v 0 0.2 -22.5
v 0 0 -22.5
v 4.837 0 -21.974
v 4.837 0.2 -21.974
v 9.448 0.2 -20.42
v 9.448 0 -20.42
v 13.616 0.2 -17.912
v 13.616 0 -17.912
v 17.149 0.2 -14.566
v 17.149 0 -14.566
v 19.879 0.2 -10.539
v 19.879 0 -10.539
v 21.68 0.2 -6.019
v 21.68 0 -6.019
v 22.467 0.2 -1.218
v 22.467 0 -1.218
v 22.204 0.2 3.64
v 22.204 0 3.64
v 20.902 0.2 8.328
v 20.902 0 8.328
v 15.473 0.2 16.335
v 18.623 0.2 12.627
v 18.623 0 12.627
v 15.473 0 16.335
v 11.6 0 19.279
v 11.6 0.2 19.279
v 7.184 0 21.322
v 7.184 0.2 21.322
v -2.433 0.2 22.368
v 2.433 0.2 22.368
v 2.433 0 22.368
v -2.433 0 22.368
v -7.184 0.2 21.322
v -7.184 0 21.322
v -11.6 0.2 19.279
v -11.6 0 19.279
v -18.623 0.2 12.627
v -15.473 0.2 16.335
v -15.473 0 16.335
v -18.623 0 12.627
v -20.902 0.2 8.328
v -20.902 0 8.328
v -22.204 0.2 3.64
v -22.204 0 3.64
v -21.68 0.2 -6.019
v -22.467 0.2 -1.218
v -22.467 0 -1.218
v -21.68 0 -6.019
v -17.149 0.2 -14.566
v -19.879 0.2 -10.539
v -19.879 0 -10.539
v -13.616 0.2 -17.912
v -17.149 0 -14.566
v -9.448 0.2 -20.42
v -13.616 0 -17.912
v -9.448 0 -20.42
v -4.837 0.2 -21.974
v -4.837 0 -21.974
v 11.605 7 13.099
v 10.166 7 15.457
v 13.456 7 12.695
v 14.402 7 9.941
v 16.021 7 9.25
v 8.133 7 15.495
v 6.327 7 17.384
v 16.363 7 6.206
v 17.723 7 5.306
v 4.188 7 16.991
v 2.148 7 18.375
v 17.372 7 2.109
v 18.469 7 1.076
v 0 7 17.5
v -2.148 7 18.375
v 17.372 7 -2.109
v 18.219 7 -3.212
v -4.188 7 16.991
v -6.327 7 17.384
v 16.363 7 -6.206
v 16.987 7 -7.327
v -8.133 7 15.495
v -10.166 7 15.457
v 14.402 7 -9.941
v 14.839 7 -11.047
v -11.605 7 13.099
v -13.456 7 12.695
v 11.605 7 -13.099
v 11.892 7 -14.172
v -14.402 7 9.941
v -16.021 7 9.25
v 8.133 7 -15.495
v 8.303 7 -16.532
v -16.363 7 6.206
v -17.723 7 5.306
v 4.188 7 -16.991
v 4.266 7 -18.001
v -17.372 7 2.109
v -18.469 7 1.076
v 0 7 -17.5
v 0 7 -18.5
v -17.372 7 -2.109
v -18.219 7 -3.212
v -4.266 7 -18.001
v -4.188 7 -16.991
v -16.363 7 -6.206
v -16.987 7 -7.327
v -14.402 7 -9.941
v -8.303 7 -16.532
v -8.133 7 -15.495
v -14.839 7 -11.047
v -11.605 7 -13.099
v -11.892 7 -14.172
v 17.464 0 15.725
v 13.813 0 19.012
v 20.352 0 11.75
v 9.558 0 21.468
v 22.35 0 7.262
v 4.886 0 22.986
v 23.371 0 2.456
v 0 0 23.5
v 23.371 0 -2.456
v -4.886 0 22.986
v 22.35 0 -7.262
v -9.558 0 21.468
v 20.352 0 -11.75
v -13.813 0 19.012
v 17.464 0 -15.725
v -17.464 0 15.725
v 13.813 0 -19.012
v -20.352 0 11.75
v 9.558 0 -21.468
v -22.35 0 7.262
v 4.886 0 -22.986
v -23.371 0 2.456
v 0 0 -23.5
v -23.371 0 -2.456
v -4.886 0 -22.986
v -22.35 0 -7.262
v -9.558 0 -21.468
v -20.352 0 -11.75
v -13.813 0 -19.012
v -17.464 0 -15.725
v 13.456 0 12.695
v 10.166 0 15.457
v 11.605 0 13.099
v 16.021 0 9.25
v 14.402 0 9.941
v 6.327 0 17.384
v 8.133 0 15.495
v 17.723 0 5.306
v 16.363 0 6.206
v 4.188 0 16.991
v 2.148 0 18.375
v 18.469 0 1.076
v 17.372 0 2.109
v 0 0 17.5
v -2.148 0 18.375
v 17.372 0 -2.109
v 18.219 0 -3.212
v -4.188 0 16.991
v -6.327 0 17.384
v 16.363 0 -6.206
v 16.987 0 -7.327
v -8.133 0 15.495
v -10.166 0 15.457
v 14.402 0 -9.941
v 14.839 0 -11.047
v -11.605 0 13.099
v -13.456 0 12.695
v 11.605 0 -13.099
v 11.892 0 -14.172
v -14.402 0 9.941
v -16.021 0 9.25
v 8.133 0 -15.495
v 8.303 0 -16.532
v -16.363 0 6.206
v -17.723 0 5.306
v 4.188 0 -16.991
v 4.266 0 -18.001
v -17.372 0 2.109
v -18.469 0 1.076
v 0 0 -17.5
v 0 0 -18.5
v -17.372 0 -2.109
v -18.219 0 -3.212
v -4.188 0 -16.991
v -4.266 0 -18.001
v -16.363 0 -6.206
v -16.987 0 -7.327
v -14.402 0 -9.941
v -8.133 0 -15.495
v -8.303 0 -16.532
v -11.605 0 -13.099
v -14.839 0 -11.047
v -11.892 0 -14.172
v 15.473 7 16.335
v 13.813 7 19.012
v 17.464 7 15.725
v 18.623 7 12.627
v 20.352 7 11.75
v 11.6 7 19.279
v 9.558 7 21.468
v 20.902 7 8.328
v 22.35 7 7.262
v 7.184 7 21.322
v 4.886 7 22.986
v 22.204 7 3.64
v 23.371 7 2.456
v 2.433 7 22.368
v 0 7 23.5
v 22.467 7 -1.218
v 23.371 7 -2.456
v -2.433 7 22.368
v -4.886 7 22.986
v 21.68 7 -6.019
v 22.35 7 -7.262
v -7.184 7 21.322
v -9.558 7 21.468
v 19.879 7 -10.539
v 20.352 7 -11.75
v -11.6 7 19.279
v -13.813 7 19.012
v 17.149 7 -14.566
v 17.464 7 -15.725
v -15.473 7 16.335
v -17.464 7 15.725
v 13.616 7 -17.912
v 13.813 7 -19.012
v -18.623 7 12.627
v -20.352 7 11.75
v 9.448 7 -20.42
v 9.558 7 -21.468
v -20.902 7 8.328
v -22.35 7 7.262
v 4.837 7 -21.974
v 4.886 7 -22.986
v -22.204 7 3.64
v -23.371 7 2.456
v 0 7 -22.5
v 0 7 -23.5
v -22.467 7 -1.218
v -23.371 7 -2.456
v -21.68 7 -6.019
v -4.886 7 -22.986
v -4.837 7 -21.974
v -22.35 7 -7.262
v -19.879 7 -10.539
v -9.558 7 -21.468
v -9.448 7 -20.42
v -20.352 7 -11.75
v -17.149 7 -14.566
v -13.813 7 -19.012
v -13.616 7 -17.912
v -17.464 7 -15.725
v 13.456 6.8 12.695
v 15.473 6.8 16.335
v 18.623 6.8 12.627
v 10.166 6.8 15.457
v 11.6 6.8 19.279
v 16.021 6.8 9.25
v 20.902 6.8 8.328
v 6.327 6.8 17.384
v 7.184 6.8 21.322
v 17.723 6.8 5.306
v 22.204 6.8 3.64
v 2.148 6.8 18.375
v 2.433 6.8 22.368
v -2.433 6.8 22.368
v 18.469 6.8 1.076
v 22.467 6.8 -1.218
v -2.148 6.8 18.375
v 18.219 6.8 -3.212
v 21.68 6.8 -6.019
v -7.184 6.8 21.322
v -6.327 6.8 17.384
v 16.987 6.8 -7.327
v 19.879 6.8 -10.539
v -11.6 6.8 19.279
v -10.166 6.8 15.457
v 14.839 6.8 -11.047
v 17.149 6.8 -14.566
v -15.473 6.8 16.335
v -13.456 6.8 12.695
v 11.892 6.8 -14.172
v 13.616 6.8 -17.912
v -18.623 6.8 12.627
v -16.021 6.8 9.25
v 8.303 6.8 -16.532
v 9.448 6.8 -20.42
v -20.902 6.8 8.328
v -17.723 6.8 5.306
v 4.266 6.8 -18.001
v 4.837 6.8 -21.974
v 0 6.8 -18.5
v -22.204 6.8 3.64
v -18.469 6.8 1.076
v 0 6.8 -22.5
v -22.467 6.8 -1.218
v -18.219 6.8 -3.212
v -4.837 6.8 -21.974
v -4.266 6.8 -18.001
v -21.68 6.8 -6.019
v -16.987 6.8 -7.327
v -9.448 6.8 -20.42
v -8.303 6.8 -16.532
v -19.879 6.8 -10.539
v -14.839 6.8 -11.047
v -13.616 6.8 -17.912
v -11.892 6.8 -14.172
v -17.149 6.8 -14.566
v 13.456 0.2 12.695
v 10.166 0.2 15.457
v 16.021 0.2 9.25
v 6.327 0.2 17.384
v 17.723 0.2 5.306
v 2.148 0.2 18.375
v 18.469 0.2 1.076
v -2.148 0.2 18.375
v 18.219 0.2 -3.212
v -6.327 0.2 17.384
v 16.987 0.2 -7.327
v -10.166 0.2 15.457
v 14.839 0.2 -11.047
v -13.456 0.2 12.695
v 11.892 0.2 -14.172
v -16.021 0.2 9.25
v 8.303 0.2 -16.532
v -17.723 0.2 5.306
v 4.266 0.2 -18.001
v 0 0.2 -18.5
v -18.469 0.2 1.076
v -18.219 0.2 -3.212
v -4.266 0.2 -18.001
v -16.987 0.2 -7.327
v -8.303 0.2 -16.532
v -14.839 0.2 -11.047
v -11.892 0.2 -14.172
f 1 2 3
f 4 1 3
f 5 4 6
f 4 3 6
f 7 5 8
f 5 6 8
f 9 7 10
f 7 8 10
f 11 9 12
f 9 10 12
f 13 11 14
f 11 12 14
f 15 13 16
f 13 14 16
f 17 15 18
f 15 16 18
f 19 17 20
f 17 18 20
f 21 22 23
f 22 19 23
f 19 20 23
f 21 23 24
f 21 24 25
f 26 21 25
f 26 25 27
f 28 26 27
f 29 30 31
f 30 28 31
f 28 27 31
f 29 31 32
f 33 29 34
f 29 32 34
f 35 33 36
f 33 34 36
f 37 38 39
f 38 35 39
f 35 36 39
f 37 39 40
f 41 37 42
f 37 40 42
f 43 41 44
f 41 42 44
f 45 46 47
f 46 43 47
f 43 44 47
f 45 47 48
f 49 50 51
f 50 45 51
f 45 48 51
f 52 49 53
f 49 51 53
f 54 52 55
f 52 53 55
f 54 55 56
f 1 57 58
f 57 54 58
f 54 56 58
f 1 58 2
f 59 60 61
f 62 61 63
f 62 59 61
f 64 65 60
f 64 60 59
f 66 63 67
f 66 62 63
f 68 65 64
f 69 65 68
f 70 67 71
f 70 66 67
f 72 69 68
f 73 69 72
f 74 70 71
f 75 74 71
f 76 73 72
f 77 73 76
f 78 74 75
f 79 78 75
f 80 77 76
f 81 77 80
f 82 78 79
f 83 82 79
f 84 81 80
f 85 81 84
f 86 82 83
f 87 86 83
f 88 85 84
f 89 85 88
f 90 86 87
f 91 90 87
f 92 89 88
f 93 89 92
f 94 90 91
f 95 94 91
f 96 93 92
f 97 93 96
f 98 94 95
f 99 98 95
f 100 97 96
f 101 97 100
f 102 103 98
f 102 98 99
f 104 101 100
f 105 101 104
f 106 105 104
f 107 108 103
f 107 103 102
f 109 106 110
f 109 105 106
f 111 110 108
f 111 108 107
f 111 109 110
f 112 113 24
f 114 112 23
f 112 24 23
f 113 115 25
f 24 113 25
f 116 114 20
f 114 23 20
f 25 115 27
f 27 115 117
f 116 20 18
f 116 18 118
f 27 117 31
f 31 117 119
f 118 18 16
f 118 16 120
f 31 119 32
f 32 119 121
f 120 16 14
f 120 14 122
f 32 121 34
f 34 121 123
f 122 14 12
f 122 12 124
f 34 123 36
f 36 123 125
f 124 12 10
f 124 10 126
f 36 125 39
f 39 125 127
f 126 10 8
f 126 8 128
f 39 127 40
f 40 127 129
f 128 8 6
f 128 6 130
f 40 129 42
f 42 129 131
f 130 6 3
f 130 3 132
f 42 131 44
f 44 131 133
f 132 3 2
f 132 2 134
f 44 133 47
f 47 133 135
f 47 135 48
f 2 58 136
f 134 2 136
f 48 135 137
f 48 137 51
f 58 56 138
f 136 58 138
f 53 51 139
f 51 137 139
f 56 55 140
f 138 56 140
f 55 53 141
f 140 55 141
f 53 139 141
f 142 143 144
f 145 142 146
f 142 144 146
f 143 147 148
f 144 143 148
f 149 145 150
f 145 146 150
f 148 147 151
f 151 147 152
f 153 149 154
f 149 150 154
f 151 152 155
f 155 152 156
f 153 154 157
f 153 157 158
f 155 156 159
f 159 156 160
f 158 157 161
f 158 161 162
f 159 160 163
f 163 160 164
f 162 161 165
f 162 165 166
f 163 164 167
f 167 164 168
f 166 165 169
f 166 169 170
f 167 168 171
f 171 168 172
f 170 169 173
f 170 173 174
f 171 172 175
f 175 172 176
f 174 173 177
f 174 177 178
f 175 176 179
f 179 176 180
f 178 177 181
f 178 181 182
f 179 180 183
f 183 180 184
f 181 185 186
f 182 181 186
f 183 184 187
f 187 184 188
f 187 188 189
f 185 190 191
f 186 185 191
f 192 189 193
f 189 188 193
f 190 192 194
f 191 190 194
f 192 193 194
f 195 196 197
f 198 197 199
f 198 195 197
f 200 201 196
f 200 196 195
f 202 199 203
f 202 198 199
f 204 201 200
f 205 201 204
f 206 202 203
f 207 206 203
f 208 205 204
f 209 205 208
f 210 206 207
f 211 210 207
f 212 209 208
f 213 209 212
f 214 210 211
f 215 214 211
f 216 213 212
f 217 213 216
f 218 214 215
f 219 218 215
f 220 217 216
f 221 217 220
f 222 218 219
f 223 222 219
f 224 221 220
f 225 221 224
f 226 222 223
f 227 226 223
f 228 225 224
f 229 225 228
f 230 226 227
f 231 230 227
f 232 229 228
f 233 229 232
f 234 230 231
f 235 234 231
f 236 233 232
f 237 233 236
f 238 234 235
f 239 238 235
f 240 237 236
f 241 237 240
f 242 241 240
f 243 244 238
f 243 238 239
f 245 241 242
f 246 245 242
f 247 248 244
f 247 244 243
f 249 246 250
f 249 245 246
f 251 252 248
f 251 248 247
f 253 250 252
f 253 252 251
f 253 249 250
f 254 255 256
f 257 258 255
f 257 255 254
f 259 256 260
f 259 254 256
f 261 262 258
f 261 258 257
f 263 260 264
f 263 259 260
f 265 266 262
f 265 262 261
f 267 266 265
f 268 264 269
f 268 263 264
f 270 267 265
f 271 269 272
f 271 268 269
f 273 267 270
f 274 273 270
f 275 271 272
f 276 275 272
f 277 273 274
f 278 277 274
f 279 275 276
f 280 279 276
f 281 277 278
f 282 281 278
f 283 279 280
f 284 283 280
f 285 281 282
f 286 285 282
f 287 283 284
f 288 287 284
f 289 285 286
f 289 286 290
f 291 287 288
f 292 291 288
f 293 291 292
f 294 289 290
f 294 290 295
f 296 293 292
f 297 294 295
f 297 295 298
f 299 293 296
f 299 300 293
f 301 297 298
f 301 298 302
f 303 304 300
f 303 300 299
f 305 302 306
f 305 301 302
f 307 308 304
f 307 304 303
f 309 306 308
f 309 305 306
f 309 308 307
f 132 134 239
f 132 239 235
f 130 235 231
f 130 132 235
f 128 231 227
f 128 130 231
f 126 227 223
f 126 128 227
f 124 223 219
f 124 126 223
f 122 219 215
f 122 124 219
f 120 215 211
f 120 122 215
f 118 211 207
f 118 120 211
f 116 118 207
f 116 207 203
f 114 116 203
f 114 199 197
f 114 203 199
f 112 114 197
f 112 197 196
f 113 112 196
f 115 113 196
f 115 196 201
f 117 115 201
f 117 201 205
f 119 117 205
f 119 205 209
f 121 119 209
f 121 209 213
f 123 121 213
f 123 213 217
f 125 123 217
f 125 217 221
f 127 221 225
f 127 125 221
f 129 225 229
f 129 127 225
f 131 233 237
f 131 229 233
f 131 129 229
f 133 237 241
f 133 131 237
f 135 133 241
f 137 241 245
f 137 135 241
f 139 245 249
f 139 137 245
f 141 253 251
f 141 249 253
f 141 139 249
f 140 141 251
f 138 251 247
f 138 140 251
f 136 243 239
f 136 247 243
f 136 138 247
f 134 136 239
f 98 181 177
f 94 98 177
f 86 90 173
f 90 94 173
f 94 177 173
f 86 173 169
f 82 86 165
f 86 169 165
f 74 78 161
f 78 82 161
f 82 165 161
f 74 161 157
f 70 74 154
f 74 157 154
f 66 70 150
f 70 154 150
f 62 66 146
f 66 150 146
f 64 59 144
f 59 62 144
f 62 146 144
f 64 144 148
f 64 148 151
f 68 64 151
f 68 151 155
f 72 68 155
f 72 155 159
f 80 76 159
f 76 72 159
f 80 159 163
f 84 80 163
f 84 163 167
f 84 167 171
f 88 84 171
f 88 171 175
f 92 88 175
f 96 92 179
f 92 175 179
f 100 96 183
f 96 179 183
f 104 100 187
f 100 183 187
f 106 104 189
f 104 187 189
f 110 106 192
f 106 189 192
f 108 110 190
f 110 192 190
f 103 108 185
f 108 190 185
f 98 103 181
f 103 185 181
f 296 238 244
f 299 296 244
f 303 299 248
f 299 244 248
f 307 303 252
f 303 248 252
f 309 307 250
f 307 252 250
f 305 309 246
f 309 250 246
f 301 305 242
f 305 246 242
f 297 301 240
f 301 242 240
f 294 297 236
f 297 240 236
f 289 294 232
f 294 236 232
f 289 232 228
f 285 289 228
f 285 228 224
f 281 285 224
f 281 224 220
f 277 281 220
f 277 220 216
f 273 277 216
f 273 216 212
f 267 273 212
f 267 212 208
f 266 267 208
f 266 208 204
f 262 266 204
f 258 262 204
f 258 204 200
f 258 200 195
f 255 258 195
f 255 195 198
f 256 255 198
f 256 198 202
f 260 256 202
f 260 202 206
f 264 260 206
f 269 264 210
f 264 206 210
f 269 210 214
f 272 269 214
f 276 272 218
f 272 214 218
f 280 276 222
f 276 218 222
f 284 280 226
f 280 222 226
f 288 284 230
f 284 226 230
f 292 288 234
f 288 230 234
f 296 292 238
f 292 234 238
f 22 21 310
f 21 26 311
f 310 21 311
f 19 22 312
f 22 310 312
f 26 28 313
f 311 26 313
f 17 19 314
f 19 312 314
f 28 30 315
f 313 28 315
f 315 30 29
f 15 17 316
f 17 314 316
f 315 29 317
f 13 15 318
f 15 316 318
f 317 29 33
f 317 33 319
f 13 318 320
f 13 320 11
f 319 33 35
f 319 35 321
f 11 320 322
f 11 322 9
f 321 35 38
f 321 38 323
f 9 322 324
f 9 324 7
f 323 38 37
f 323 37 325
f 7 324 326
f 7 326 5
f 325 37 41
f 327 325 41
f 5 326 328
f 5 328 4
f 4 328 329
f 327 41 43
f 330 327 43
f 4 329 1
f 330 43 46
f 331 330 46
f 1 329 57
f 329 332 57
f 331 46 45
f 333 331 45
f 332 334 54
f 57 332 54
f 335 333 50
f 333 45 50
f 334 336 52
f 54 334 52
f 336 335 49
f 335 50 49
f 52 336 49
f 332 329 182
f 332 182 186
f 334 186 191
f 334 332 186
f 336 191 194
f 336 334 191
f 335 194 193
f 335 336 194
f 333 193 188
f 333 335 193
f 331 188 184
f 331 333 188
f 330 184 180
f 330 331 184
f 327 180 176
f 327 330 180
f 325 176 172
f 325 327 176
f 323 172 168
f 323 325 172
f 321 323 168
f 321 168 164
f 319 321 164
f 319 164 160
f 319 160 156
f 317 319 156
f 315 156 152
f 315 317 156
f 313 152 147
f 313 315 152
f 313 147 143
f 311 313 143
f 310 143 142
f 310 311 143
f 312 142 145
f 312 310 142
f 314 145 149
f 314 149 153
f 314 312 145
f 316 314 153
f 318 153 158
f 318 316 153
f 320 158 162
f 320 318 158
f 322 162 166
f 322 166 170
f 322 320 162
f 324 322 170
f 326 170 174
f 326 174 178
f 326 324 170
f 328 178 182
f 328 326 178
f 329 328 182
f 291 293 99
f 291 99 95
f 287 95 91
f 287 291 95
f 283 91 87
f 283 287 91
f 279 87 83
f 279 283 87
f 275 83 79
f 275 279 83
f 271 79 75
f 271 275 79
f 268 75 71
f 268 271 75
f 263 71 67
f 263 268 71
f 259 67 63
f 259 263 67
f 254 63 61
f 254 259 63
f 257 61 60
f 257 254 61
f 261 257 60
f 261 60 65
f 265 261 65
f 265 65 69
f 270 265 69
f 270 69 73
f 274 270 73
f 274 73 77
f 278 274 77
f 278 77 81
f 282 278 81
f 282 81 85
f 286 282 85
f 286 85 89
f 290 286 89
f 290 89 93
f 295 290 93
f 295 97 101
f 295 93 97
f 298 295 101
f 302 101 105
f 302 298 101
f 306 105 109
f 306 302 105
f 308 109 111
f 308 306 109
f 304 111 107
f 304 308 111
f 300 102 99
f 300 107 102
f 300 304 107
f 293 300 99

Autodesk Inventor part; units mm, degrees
ref_plane "YZ Plane" through (0, 0, 0) normal (1, 0, 0) x (0, 1, 0)
ref_plane "XZ Plane" through (0, 0, 0) normal (0, 1, 0) x (-1, 0, 0)
ref_plane "XY Plane" through (0, 0, 0) normal (0, 0, 1) x (1, 0, 0)
sketch "Sketch1" plane through (0, 0, 0) normal (1, 0, 0) x (0, 1, 0)
  line L0 (0, 0) -> (7, 0) construction
  line L1 (7, 0) -> (7, -17.5) construction
  line L2 (7, -17.5) -> (0, -17.5)
  line L3 (0, -17.5) -> (0, 0) construction
  line L4 (7, -23.5) -> (0, -23.5)
  line L5 (7, -18.5) -> (6.8, -18.5)
  line L6 (6.8, -18.5) -> (6.8, -22.5)
  line L7 (6.8, -22.5) -> (7, -22.5)
  line L8 (0, -18.5) -> (0.2, -18.5)
  line L9 (0.2, -18.5) -> (0.2, -22.5)
  line L10 (0.2, -22.5) -> (0, -22.5)
  line L11 (7, -17.5) -> (7, -18.5)
  line L12 (7, -22.5) -> (7, -23.5)
  line L13 (0, -23.5) -> (0, -22.5)
  line L14 (0, -18.5) -> (0, -17.5)
  dimension "d0" = 17.5
  dimension "d2" = 7
  dimension "d5" = 23.5
  dimension "d6" = 0.2
  dimension "d7" = 1
revolve "Revolution1" add sketch "Sketch1" angle 360 about axis through (0, 0, 0) along (0, 1, 0)
properties part number "6807 bearing"
